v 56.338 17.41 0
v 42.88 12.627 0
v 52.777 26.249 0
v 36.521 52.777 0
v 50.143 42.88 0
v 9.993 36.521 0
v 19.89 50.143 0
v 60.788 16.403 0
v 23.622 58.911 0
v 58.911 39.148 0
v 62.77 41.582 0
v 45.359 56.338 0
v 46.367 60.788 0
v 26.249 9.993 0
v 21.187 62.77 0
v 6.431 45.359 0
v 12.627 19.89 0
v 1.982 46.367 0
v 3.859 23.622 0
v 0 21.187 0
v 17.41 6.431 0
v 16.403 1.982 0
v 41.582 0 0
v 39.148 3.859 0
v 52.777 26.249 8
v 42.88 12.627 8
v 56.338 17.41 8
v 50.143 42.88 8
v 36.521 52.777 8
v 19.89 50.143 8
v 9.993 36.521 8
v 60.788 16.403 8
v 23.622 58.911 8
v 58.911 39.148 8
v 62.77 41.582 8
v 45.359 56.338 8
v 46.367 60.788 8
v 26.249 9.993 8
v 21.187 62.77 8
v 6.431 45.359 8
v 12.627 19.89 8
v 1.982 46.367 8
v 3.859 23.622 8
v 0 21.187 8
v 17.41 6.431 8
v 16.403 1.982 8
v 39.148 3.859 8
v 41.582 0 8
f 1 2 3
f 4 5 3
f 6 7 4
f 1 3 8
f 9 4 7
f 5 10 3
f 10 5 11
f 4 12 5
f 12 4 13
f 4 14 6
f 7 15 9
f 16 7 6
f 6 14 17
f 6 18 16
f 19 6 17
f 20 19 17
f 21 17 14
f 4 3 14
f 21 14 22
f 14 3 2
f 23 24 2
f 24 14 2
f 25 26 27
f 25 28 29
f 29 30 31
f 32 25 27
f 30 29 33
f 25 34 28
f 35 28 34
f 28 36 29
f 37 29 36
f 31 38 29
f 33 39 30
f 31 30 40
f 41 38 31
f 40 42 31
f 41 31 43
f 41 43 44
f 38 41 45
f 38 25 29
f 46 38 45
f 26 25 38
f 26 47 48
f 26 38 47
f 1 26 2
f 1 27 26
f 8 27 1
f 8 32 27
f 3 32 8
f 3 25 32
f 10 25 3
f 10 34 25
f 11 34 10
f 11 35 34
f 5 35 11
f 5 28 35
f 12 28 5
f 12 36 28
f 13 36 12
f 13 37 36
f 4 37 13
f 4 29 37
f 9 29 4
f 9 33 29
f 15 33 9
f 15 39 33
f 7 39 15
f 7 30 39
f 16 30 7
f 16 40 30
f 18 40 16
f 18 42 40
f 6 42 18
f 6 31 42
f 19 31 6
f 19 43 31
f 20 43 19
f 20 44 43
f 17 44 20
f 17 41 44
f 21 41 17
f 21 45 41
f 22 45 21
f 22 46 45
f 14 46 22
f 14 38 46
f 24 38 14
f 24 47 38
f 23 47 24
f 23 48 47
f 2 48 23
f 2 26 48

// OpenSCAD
$fn = 32;

// ----------------------------------------------------------------------
// Fan rotor section: 8 blades, 22 mm hub radius, 11 mm blades
// ----------------------------------------------------------------------

// --- parameters (mm) ---
profile_height = 8;       // extrusion height
profile_points = 24;      // points of the closed outline

profile = [[52.777, 26.249], [58.911, 39.148], [62.77, 41.582], [50.143, 42.88], [45.359, 56.338], [46.367, 60.788], [36.521, 52.777], [23.622, 58.911], [21.187, 62.77], [19.89, 50.143], [6.431, 45.359], [1.982, 46.367], [9.993, 36.521], [3.859, 23.622], [0, 21.187], [12.627, 19.89], [17.41, 6.431], [16.403, 1.982], [26.249, 9.993], [39.148, 3.859], [41.582, 0], [42.88, 12.627], [56.338, 17.41], [60.788, 16.403]];  // single closed polygon, 24 points, counter clockwise

// --- the one profile operation ---
linear_extrude(height = profile_height) polygon(points = profile);
